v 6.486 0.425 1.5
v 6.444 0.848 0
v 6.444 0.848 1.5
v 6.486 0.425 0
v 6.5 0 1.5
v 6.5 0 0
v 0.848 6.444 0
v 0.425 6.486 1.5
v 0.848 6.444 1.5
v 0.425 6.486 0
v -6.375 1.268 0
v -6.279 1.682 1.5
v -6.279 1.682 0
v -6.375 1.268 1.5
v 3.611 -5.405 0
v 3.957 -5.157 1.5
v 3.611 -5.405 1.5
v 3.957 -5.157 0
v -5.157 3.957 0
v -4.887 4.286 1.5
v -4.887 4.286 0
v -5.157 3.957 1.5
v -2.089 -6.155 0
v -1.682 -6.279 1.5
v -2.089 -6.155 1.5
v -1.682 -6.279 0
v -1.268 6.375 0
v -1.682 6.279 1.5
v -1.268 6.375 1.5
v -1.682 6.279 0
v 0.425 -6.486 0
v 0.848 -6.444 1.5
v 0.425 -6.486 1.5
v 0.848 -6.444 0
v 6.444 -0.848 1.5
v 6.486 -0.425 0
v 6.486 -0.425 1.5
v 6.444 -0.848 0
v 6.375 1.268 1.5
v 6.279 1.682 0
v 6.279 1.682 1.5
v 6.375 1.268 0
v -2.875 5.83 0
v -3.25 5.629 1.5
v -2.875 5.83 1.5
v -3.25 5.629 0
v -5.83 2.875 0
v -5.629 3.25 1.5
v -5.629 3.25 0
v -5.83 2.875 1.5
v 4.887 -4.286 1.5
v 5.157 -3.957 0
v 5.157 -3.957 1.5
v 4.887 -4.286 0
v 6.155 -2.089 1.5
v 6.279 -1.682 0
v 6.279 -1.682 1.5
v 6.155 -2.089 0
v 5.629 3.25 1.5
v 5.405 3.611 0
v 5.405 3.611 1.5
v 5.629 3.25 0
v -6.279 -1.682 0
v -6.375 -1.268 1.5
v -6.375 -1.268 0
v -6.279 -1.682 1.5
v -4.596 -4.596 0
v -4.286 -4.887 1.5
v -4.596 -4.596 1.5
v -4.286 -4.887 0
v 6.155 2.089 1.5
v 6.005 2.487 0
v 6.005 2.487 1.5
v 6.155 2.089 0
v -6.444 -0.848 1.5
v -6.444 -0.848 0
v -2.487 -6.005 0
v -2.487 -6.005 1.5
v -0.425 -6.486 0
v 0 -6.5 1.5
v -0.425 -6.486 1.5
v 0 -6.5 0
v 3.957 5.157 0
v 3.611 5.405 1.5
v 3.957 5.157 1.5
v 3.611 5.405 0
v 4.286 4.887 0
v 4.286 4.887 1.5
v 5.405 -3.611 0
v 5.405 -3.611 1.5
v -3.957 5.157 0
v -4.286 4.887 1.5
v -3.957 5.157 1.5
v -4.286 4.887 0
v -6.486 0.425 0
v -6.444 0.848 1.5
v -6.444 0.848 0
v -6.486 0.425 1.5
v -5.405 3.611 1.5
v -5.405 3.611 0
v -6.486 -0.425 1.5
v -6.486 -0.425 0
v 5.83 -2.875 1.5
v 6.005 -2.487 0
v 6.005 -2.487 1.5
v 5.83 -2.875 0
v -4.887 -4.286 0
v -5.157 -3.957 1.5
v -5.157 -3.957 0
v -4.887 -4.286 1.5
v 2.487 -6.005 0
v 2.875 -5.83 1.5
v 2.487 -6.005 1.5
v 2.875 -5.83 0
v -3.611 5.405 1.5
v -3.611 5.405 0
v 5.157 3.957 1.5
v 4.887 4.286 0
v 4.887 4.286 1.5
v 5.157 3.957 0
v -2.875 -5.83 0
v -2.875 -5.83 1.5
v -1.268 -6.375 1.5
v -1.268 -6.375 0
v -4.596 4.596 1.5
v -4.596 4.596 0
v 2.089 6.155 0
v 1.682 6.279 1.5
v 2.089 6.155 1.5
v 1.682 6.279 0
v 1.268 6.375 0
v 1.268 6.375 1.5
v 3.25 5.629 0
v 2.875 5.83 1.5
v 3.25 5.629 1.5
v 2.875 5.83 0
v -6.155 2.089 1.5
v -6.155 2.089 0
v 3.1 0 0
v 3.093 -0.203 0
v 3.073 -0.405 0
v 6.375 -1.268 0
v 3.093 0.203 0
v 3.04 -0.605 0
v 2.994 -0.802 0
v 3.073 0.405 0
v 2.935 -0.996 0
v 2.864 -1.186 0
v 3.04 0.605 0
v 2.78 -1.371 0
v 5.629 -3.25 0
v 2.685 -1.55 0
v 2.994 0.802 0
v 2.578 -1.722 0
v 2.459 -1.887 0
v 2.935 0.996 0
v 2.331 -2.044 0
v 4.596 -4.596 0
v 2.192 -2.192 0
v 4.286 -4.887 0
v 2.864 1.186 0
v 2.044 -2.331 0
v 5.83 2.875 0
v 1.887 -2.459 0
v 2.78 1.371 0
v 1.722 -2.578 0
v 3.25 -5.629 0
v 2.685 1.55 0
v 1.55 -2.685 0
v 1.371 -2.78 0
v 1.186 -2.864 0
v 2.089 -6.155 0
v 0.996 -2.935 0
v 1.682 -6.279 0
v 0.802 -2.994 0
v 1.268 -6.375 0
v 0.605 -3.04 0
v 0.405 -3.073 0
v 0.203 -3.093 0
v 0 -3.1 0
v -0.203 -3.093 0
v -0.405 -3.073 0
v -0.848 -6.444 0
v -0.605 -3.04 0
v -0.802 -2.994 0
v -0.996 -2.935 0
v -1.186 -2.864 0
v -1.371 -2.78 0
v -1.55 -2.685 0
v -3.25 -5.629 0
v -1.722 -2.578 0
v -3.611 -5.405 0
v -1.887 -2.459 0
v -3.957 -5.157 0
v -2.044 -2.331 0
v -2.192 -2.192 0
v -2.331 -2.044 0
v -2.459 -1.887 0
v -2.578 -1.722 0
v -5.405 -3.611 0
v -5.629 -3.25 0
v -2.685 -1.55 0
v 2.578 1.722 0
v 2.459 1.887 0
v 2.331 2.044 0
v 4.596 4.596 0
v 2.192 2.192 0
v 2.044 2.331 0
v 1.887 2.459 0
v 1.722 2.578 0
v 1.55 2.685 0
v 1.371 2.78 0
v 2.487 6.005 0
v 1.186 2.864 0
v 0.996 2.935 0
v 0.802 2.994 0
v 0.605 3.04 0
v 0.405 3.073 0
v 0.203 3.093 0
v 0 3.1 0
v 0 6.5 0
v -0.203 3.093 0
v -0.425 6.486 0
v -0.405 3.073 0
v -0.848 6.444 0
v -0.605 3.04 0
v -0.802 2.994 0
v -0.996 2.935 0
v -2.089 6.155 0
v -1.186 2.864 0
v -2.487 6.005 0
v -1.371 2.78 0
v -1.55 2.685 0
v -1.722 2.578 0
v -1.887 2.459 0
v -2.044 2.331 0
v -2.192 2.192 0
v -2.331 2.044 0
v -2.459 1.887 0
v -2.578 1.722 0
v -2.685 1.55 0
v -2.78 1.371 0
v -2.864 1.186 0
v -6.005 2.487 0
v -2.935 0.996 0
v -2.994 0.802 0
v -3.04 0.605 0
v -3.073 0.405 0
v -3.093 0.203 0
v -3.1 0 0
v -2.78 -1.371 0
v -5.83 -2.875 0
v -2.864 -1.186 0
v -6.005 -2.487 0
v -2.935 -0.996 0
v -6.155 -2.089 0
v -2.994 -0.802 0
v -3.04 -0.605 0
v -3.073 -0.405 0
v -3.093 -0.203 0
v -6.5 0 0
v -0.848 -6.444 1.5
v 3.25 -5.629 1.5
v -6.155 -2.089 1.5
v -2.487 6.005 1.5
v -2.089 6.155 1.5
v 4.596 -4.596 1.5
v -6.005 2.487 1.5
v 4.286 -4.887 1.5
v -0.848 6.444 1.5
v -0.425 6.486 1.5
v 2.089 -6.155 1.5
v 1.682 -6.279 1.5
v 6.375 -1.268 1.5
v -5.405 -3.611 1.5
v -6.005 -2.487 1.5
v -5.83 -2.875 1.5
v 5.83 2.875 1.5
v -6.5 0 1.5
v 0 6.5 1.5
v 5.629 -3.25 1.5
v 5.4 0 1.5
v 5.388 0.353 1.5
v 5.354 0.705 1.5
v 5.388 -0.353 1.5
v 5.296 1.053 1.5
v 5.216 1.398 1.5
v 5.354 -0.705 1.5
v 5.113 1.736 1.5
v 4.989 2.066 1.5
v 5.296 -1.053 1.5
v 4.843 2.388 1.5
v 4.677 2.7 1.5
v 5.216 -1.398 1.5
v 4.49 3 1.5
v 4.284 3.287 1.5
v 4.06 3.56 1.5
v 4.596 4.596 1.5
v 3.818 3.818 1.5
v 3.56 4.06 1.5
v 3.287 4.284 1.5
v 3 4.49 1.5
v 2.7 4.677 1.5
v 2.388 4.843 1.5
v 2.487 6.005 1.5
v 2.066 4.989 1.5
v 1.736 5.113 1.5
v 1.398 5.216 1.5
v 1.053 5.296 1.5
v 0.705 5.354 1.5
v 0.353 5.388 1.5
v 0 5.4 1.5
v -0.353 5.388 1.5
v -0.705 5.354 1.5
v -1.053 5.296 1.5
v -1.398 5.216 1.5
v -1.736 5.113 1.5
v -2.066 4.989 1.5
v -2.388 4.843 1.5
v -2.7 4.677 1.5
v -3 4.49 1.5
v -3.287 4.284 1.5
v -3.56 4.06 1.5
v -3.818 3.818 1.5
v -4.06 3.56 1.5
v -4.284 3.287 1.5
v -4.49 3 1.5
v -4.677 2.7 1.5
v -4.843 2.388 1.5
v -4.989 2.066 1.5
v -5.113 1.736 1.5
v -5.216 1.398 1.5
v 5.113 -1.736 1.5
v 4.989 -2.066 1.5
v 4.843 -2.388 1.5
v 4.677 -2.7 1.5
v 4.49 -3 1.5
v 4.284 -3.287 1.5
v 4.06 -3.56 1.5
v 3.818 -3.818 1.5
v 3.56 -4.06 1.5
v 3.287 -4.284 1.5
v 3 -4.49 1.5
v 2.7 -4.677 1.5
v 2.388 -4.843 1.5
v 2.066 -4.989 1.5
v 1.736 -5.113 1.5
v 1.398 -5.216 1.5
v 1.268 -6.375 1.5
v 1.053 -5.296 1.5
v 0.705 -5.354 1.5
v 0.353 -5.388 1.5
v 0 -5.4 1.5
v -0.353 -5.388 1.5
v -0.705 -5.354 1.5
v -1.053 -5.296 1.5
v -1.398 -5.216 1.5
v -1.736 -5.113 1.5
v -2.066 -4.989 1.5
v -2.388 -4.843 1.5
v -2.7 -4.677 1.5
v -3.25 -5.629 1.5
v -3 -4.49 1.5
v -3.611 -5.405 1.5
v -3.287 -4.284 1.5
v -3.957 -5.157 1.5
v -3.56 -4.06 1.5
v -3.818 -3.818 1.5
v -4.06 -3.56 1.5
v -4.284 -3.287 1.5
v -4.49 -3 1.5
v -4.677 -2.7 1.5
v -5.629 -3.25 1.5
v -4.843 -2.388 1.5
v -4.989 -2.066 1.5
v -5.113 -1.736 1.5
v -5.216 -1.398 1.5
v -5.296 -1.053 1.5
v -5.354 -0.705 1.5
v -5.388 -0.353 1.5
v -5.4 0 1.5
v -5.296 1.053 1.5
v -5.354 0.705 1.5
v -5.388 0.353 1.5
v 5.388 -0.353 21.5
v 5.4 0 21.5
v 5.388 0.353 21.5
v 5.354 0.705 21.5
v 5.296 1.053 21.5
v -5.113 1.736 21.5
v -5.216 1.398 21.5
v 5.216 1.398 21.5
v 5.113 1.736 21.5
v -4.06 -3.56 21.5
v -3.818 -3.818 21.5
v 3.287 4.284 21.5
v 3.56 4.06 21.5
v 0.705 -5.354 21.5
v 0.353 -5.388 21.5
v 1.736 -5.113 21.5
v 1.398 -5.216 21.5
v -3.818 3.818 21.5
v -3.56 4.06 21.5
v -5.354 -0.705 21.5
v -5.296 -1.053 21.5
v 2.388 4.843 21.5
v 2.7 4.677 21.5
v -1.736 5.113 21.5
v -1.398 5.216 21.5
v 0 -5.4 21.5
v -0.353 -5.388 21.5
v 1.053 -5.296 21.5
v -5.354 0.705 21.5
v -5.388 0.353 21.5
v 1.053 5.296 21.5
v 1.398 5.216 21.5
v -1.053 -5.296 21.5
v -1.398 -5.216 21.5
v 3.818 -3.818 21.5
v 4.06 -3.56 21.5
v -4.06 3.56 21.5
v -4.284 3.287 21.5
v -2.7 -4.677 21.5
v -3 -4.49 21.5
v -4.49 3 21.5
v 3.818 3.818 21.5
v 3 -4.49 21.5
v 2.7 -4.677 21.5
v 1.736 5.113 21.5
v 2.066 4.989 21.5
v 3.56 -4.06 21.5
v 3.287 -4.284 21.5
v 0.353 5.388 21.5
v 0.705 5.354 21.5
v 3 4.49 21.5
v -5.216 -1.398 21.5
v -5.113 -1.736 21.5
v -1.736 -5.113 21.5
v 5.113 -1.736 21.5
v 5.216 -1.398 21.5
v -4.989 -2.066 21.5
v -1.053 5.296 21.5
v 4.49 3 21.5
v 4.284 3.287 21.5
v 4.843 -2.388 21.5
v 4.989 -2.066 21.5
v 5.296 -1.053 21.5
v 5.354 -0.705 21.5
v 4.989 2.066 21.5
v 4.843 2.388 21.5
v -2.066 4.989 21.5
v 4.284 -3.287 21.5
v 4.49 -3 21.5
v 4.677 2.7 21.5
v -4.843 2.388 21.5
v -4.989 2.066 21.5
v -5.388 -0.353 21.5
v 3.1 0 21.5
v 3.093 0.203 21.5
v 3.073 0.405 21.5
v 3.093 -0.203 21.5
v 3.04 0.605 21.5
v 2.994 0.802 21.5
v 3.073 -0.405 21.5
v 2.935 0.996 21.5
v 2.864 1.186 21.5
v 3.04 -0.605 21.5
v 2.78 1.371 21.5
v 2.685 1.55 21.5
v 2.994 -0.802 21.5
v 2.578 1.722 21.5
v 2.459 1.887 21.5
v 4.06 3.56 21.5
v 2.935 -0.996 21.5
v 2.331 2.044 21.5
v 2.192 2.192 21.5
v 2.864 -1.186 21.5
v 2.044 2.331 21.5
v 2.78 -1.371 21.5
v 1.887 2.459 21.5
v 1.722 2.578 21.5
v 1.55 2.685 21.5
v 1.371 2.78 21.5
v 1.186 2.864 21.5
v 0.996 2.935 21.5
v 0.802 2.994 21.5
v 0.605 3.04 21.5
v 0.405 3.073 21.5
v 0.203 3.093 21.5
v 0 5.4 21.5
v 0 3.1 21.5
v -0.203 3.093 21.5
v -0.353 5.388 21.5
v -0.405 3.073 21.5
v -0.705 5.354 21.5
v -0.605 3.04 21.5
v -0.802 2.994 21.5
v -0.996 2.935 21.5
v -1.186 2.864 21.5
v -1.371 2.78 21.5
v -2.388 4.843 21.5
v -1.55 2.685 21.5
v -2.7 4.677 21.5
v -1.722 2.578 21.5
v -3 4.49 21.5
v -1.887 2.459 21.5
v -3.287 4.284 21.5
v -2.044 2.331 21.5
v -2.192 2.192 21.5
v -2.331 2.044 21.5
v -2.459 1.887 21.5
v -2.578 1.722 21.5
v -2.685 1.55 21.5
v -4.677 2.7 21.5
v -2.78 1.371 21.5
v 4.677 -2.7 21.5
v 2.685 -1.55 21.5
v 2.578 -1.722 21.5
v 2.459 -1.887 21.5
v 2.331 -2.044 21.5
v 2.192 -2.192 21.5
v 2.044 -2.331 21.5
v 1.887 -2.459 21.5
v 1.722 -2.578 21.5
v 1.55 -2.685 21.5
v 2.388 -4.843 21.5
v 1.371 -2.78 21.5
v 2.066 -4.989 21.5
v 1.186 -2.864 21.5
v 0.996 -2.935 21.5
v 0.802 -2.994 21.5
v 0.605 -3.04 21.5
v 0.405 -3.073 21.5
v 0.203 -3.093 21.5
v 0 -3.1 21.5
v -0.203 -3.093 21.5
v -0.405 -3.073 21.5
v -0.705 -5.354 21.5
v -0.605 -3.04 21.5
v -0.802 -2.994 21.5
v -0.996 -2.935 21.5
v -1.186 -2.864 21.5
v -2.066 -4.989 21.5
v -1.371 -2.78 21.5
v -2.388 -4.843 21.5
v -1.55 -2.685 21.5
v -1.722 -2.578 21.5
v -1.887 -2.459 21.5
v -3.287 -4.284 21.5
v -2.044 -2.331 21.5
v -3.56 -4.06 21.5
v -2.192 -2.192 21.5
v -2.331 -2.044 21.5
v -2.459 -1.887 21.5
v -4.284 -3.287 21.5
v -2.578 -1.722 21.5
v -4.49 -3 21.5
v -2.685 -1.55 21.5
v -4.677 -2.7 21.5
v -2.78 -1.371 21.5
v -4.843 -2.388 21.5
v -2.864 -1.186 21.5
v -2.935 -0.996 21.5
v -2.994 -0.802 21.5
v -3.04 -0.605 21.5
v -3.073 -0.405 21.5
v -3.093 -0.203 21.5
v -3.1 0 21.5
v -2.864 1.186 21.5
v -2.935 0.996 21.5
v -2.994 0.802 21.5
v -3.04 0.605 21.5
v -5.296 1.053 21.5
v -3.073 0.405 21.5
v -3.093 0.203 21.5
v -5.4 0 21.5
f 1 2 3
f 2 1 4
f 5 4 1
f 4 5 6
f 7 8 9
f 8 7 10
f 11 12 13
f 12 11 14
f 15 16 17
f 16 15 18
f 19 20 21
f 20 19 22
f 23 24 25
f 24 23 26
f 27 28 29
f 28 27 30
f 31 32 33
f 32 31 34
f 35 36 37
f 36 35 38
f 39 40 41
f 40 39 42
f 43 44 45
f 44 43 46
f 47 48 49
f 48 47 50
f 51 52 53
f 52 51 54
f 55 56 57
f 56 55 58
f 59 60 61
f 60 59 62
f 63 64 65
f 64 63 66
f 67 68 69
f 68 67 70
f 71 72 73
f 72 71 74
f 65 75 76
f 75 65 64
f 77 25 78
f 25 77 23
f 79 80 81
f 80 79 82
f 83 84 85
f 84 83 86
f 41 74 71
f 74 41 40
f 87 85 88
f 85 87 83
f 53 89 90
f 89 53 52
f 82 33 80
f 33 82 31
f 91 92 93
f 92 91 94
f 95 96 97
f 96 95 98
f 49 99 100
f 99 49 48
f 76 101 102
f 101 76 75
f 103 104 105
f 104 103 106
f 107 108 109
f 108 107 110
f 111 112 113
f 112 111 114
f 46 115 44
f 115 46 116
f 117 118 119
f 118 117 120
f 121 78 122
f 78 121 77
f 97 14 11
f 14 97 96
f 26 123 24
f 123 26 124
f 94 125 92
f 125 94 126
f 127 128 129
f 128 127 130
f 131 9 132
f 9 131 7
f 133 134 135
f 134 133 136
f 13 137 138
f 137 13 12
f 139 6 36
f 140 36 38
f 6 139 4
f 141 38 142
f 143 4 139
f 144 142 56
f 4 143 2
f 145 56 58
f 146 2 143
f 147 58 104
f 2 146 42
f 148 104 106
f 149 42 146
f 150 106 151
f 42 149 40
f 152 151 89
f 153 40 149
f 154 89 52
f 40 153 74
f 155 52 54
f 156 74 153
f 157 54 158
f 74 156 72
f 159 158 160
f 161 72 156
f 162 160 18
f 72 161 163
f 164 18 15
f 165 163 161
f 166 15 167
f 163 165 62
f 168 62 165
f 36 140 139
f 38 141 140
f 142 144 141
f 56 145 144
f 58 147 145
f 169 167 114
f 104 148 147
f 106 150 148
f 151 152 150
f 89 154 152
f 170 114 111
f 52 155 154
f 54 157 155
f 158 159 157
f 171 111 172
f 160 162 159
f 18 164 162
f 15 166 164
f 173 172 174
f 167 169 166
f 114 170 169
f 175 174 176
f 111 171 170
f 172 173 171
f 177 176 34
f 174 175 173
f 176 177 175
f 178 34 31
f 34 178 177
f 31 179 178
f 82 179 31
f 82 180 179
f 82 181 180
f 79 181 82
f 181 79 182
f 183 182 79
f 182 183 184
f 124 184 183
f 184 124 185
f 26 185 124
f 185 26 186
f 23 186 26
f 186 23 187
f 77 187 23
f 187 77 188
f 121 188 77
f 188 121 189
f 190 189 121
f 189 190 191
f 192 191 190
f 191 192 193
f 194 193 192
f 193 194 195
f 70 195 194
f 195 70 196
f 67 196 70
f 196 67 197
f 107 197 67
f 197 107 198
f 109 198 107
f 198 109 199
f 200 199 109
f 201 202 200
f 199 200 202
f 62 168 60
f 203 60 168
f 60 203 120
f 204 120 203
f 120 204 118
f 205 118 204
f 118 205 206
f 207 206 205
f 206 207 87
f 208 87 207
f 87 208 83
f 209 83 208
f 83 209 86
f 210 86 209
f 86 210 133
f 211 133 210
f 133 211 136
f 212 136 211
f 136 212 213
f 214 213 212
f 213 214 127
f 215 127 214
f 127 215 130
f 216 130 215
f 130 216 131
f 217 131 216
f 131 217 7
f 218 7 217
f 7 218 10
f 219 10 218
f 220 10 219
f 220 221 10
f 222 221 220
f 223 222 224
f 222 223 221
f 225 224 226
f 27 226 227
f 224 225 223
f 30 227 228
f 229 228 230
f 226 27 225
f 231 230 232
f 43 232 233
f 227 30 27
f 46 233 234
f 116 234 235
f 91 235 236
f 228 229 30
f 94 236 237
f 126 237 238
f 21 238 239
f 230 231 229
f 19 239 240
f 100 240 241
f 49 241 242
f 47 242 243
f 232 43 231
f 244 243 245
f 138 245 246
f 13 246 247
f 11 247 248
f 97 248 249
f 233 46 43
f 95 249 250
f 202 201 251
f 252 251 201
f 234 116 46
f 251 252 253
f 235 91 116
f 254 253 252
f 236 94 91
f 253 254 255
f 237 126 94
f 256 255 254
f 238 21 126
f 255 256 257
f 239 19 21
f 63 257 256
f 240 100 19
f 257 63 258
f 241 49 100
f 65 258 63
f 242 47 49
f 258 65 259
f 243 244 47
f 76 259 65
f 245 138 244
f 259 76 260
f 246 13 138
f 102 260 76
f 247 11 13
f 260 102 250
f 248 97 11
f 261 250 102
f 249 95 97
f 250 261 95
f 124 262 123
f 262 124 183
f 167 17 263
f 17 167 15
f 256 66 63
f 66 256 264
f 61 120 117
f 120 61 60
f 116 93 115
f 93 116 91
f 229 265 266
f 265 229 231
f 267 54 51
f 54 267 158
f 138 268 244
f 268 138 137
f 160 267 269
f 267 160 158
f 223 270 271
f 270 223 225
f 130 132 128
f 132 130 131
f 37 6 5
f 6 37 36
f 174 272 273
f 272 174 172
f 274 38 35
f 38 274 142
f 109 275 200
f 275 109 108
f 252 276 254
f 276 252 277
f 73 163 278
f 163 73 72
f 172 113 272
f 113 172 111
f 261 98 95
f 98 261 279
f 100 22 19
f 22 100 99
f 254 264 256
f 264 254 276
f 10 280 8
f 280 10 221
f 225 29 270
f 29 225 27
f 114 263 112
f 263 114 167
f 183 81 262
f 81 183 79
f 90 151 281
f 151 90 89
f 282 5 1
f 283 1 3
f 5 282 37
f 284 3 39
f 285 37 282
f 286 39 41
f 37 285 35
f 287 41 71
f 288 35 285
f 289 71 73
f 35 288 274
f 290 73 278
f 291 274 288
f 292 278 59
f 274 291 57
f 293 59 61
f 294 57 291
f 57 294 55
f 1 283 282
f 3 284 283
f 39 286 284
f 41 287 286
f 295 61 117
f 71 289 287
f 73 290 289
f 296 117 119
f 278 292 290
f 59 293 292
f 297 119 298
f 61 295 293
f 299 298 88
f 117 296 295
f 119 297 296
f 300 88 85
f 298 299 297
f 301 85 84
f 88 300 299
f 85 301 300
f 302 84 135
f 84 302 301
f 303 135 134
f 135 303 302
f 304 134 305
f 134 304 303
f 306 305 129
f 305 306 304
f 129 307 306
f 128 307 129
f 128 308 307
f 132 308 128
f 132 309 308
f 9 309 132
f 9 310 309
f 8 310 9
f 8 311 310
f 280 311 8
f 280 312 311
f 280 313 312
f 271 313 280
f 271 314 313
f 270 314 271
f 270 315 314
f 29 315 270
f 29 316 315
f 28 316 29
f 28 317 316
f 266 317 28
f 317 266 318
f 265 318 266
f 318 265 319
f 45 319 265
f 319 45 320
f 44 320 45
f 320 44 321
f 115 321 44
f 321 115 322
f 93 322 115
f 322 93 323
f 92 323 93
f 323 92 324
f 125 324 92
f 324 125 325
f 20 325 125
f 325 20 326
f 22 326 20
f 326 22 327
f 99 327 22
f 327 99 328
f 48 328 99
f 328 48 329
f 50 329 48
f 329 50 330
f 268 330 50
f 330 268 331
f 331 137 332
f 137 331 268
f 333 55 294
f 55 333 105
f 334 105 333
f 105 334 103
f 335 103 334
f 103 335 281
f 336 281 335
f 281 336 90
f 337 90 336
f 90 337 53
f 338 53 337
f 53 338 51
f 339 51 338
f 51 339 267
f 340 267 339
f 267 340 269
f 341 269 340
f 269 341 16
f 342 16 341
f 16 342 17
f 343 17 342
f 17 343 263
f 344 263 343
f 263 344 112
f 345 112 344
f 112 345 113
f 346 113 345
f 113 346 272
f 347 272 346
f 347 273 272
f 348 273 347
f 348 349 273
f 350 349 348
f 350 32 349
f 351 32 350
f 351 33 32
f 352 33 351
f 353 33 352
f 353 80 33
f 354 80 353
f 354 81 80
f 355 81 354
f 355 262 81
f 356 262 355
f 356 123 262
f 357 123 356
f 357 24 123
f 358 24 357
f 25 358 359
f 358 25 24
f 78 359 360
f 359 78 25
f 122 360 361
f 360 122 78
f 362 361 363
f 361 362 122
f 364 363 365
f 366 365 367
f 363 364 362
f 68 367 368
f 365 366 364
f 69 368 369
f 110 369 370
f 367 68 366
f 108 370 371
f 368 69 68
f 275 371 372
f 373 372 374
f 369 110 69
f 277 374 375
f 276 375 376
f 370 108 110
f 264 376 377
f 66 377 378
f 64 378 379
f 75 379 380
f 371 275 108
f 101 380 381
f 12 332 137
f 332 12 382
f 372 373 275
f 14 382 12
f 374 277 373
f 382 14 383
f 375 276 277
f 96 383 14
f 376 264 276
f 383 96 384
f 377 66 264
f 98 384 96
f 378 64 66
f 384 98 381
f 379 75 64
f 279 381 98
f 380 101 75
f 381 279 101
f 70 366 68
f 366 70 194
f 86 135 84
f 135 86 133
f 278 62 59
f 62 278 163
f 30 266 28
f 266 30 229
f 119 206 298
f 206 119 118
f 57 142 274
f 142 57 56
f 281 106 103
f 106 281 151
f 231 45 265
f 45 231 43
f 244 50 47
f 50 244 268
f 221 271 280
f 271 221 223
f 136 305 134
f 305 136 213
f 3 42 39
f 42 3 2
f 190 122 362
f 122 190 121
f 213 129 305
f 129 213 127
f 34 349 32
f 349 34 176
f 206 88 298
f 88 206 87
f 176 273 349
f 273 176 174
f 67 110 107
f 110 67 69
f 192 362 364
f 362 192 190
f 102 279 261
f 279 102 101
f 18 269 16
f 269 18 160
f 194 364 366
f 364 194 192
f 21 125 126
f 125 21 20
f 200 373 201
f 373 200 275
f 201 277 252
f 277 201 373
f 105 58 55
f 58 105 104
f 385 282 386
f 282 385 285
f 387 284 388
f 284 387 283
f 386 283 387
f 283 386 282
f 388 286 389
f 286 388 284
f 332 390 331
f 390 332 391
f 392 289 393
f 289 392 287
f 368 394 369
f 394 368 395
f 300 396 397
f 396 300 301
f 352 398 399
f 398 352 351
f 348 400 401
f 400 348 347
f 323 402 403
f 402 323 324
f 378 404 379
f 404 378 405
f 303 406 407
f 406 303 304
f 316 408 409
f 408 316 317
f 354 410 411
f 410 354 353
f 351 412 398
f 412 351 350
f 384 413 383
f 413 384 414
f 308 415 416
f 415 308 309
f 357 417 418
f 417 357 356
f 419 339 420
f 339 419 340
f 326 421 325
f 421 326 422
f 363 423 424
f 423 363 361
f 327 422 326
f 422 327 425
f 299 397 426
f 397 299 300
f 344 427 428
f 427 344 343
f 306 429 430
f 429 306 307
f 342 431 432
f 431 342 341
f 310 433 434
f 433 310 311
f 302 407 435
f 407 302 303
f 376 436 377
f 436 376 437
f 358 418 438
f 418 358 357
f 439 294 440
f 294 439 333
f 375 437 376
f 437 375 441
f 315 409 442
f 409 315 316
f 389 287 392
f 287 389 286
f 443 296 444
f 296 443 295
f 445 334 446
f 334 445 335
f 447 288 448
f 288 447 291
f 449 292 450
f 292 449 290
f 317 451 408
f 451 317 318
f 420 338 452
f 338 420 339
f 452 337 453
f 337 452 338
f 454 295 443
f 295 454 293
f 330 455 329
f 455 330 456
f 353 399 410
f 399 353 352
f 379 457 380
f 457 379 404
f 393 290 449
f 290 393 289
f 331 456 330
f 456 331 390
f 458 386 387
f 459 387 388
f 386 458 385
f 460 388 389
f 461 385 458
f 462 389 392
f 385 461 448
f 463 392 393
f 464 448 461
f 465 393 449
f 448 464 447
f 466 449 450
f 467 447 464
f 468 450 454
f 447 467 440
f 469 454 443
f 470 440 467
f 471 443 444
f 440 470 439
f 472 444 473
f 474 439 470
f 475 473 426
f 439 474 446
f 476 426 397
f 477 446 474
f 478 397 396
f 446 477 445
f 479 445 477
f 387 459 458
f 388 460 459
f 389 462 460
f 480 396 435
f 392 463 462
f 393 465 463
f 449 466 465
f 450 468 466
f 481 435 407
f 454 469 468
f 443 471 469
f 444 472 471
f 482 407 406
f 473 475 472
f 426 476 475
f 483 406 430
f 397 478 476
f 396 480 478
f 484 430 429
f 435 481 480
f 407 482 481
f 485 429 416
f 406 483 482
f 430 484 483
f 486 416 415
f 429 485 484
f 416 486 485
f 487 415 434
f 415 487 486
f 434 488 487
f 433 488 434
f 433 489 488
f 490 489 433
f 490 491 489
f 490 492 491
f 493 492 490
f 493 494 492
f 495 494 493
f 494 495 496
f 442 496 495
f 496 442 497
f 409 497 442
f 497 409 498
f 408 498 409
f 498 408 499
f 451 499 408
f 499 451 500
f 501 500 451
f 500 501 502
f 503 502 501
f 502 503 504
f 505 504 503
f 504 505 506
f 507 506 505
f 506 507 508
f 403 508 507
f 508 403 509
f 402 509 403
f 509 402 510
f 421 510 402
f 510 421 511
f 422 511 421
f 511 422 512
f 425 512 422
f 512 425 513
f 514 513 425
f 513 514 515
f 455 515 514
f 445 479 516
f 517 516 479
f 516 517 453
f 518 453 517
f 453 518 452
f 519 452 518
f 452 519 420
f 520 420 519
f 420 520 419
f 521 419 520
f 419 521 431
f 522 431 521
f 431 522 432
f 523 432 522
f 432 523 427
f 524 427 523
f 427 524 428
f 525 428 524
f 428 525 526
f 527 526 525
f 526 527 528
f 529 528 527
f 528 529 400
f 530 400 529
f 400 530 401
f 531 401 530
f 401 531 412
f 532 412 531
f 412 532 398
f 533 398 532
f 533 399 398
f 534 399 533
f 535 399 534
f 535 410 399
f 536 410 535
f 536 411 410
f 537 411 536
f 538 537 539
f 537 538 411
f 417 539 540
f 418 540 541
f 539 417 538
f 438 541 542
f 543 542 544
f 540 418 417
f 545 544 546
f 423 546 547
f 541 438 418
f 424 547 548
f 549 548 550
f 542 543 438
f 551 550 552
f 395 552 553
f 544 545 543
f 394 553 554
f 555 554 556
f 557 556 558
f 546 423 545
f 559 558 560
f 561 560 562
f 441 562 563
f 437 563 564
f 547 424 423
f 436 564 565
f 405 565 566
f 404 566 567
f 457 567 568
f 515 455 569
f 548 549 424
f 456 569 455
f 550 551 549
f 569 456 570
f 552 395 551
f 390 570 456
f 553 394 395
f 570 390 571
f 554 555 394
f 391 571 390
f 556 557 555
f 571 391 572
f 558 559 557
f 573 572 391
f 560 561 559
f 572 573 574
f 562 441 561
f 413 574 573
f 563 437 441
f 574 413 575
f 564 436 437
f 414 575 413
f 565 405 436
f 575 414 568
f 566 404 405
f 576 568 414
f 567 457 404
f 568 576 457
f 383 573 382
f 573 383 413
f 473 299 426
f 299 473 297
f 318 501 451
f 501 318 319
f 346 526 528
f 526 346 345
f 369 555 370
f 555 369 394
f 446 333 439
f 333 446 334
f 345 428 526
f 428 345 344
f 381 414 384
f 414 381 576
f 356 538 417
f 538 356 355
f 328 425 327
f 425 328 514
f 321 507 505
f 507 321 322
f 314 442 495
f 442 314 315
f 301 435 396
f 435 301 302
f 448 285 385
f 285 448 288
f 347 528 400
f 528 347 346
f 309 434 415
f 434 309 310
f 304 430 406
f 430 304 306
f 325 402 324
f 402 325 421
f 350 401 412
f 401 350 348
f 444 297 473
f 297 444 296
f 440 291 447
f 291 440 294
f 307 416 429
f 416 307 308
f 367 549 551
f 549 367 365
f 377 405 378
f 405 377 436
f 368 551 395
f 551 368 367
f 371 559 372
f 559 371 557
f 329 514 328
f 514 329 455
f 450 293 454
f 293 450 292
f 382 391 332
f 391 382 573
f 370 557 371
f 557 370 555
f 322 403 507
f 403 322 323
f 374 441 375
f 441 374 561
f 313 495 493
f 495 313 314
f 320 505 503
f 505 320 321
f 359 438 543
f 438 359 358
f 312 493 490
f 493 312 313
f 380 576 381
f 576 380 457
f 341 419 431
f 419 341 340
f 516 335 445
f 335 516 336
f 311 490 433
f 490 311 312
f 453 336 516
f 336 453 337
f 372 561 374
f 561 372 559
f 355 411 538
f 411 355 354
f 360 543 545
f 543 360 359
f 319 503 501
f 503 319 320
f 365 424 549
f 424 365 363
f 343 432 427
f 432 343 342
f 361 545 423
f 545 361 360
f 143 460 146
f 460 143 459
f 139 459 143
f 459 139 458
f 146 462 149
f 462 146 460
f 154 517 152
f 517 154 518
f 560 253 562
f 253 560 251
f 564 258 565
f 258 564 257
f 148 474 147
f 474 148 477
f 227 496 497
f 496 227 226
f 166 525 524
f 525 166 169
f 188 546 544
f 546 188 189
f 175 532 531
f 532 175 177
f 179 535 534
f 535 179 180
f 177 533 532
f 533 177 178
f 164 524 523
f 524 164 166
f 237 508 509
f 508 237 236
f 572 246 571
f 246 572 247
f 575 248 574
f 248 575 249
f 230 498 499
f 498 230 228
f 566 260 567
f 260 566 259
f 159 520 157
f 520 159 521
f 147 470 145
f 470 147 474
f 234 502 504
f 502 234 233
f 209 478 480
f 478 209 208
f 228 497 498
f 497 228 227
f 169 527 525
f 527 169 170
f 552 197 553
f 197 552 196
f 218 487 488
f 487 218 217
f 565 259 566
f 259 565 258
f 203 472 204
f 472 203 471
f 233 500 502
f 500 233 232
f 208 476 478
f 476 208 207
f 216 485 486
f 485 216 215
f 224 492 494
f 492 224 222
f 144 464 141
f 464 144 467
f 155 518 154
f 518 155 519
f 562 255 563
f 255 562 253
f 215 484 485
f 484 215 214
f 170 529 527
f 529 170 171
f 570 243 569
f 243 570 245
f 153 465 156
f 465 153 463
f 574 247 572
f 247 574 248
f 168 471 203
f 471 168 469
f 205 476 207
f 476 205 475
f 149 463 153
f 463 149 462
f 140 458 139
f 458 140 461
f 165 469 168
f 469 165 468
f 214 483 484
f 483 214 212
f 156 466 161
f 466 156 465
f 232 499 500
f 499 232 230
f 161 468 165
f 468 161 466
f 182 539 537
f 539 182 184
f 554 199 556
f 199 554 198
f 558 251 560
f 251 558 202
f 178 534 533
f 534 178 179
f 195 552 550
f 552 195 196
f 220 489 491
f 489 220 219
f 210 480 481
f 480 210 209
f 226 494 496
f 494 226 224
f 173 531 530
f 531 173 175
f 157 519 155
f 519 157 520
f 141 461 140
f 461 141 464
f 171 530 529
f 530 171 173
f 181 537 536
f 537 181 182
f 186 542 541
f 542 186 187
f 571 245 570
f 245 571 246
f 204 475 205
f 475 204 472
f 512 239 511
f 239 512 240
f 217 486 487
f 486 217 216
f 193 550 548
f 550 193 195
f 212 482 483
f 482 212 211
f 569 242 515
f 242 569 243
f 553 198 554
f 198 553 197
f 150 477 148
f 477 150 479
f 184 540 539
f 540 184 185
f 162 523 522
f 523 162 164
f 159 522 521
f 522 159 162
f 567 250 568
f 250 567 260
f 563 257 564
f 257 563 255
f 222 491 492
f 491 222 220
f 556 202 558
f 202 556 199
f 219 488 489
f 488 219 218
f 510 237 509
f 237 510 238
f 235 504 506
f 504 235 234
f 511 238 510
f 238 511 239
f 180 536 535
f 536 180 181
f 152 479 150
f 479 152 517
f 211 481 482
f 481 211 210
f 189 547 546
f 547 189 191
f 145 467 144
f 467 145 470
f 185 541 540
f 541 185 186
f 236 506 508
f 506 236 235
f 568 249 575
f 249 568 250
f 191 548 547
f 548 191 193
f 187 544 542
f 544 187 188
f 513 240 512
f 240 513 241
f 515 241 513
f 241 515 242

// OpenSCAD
// PCR tube adapter sleeve - fits a 0.2 mL tube into a 1.5 mL rack hole
// Print orientation: collar on bed (z = 0), sleeve body builds upward

// ---- Dimensions (mm) ----
collar_d        = 13;     // collar outer diameter
collar_t        = 1.5;    // collar thickness
sleeve_d        = 10.8;   // sleeve outer diameter
sleeve_h        = 20;     // sleeve body height (z = 1.5 to 21.5)
bore_d          = 6.2;    // through-bore diameter
eps             = 0.5;    // cutter overshoot past faces

$fn = 96;

// ---- Model ----
difference() {
    union() {
        // Collar: z = 0 to 1.5
        cylinder(d = collar_d, h = collar_t);
        // Sleeve body: z = 1.5 to 21.5 (slight overlap into collar for a clean union)
        translate([0, 0, collar_t - 0.01])
            cylinder(d = sleeve_d, h = sleeve_h + 0.01);
    }
    // Through-bore, open at both ends
    translate([0, 0, -eps])
        cylinder(d = bore_d, h = sleeve_h + collar_t + 2 * eps);
}
